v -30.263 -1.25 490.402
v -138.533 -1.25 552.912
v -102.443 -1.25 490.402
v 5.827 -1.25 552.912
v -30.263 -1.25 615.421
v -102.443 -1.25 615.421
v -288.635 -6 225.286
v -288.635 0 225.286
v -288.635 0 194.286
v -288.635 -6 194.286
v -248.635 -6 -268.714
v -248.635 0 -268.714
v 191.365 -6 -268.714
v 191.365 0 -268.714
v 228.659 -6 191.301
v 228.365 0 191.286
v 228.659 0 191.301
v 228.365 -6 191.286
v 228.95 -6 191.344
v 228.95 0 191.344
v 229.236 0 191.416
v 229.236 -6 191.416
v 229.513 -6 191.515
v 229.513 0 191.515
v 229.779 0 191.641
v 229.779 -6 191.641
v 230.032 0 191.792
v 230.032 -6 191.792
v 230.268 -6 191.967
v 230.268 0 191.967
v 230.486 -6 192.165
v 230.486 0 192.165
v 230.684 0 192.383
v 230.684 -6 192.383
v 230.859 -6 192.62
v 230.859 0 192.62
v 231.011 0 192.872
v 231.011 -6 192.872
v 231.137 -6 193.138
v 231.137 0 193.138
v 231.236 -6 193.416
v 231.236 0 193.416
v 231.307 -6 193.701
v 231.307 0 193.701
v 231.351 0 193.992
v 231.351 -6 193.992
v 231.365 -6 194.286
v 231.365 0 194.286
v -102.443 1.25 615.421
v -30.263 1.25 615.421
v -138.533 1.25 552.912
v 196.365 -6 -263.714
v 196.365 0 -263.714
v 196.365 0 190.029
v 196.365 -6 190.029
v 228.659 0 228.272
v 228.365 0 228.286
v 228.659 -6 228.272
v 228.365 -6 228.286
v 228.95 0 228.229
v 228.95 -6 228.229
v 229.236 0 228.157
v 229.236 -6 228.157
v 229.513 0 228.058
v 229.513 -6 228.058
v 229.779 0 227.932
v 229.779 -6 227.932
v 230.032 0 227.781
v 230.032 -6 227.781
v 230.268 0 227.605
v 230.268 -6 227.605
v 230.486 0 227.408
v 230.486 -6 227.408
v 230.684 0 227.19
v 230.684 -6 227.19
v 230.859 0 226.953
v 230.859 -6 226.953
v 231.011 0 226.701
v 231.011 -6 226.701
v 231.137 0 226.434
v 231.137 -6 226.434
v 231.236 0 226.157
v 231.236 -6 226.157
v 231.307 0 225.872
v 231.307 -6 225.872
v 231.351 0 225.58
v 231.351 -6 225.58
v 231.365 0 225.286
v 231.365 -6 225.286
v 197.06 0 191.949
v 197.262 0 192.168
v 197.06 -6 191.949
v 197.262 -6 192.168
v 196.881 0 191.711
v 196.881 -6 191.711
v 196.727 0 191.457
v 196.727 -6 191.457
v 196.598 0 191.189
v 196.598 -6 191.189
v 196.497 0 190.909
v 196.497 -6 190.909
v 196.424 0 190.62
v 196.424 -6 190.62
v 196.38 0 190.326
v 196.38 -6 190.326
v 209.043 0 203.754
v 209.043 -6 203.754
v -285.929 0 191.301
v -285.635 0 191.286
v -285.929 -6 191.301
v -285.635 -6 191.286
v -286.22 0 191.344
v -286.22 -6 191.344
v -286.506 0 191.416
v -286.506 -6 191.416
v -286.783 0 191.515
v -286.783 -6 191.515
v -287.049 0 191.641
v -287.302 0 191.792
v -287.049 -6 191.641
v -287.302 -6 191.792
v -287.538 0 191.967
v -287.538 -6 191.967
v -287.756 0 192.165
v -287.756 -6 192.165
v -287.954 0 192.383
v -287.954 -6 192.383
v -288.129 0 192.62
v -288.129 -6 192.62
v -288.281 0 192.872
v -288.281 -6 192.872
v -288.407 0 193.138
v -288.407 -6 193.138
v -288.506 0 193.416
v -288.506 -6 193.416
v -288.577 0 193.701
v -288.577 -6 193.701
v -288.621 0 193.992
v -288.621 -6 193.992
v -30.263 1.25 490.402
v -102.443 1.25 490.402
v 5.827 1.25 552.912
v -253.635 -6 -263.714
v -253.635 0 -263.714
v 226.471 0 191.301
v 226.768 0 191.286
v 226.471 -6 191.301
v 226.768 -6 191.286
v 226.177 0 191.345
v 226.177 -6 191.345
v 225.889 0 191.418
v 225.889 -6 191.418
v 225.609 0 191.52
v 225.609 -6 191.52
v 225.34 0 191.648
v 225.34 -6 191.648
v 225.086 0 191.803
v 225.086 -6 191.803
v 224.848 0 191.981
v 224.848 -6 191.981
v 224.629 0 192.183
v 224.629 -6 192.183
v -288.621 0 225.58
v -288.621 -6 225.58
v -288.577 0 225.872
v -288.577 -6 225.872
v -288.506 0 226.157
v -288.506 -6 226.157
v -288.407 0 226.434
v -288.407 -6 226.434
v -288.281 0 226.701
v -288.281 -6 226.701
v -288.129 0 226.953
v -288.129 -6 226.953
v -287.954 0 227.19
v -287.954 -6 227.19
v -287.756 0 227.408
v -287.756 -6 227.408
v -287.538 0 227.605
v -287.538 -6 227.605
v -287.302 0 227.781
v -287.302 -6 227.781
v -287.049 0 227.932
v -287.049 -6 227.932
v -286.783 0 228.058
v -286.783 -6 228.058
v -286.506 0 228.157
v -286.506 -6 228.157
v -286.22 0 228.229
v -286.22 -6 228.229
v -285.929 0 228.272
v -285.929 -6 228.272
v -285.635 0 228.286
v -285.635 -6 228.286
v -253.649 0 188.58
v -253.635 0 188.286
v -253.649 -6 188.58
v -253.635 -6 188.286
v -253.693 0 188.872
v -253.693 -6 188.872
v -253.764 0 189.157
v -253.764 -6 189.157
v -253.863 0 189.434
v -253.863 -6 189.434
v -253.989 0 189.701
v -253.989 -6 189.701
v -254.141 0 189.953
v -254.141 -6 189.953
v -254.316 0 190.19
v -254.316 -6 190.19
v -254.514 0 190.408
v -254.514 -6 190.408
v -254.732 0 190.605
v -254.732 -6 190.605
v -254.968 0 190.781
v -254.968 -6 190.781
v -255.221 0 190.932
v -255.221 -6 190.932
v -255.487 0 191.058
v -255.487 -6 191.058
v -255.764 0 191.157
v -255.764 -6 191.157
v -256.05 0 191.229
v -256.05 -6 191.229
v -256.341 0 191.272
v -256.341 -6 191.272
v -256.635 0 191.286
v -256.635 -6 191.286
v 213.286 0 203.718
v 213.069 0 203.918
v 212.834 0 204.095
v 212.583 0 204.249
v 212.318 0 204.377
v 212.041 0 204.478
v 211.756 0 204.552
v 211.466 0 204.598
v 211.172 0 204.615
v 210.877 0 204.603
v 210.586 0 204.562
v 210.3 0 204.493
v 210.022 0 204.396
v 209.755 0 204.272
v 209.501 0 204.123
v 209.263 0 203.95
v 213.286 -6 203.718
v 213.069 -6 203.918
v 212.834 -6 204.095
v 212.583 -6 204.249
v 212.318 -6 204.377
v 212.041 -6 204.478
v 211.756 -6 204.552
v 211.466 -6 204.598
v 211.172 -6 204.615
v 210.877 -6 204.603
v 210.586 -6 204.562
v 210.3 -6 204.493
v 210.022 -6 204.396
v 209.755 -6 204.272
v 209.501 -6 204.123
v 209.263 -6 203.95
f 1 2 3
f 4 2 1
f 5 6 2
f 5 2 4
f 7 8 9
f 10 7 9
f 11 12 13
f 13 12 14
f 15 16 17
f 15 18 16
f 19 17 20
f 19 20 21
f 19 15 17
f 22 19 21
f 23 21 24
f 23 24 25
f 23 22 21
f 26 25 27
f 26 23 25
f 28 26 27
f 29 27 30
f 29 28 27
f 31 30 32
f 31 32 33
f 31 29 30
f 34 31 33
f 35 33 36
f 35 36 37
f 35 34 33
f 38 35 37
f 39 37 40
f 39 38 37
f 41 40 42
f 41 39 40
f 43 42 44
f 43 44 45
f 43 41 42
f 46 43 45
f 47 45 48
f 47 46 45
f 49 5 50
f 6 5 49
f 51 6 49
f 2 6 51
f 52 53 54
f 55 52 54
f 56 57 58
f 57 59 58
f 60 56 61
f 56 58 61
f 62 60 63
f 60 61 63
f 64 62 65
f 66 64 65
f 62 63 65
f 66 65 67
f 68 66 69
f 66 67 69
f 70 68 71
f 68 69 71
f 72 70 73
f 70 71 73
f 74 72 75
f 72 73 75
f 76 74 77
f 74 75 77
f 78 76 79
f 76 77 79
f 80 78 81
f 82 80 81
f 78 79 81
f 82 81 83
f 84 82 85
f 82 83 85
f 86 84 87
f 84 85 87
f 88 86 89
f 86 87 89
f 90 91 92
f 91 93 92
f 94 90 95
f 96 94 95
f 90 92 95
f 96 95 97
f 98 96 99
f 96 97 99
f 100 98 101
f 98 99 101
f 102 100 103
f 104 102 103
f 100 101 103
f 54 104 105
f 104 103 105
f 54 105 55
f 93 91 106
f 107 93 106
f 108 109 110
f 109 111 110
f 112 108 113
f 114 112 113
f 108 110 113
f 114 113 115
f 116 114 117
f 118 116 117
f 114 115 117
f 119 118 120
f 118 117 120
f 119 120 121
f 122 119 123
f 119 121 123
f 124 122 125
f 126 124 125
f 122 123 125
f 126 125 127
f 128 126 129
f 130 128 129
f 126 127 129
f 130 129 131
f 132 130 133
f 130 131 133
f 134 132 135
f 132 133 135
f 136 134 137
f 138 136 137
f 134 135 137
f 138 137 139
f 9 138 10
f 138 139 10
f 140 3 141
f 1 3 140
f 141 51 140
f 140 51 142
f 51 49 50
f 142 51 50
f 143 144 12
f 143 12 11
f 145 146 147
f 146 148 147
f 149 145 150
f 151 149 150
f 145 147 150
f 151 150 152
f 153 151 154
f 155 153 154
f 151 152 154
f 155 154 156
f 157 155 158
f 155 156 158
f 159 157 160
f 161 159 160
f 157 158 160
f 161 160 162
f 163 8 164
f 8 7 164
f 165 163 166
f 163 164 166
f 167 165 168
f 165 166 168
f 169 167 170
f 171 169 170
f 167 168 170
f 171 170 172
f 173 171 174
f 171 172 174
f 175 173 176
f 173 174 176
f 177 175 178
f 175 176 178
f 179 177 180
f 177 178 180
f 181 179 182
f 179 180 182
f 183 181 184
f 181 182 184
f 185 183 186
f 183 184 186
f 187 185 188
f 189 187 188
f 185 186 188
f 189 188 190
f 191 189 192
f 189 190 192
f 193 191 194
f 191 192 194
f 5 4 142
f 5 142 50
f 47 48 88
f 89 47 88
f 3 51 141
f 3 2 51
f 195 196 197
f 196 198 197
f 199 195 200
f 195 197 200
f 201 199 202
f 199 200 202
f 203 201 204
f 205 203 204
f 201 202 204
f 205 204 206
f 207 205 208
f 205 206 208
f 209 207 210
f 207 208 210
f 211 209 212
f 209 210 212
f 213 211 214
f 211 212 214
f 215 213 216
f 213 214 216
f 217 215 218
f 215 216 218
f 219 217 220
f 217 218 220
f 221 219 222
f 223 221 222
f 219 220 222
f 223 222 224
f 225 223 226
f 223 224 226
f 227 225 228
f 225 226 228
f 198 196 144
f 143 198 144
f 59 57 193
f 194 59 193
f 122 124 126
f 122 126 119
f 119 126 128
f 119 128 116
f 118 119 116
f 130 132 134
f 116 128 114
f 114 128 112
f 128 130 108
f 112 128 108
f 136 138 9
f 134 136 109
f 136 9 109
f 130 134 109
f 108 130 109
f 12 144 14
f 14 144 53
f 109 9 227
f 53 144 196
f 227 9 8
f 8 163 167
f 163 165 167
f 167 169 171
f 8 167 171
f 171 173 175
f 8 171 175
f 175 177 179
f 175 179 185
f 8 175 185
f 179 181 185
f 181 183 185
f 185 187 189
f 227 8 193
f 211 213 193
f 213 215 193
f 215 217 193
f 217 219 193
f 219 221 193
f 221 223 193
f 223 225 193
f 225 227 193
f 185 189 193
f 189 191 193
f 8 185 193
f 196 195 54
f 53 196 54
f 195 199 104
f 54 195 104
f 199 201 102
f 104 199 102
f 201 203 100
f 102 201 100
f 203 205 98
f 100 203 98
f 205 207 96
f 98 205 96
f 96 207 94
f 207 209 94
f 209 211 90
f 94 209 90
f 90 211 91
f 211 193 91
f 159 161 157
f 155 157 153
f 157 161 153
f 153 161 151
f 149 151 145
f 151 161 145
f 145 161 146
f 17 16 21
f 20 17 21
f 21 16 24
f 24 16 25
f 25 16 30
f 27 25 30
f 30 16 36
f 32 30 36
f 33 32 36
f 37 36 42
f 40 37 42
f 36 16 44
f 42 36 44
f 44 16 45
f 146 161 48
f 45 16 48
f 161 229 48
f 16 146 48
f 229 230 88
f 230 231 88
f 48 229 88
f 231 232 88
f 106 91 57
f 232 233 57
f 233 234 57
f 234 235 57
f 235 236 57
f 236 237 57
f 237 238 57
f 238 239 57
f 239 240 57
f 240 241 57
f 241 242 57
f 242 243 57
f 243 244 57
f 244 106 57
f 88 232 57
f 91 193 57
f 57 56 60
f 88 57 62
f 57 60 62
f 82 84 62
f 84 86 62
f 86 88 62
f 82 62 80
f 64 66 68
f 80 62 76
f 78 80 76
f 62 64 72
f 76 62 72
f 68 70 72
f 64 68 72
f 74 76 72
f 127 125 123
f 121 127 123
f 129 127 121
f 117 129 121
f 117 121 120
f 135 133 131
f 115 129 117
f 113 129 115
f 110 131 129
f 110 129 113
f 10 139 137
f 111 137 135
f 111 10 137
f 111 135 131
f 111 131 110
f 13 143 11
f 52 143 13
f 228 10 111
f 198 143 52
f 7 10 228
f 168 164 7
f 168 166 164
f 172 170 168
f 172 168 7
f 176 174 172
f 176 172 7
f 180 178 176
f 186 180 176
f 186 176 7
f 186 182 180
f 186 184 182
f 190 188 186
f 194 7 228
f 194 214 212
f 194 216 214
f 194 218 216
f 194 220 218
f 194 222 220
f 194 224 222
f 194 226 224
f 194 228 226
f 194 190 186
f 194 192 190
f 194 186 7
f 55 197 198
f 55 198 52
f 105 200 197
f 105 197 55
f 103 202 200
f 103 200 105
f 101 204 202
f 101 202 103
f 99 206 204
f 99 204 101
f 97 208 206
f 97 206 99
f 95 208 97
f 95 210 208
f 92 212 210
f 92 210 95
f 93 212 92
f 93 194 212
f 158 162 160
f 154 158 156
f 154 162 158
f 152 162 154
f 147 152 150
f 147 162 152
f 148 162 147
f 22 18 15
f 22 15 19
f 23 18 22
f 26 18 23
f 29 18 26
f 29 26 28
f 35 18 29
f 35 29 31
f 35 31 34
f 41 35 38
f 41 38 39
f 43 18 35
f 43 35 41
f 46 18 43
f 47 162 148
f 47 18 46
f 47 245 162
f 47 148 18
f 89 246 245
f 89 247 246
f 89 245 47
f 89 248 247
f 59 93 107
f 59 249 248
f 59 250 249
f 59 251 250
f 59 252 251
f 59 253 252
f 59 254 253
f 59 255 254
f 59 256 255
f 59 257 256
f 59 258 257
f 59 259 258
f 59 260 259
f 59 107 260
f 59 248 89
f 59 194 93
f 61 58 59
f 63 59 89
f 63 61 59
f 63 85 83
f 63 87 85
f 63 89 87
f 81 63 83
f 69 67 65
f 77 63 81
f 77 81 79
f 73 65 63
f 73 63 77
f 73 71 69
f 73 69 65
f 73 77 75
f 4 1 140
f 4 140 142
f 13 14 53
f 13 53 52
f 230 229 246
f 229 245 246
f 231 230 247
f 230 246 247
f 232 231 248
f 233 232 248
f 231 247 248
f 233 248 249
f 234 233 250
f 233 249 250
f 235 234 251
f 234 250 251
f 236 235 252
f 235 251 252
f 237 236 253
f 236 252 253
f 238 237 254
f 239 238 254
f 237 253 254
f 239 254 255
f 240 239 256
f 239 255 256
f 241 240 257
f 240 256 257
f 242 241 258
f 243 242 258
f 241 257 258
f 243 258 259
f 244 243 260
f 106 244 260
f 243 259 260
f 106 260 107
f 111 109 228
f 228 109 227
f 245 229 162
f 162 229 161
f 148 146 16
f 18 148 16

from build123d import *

# Parameters (mm, degrees)
F1_DEPTH = 6
F3_DEPTH = 1.25
F4_SIZE  = 5
F5_R     = 3
F6_R     = 3
F7_R     = 3
F8_R     = 3
F9_R     = 3
F10_R    = 3
F11_R    = 3
F12_R    = 3


with BuildPart() as f1:
    # F0 (on Front) → F1 (new body)
    with BuildSketch(Plane.XZ):
        Polygon((231.364989, 228.2864), (-288.635011, 228.2864), (-288.635011, 191.2864), (-253.635011, 191.2864), (-253.635011, -268.7136), (196.364989, -268.7136), (196.364989, 191.2864), (211.182013, 205.857411), (225.511095, 191.2864), (231.364989, 191.2864), align=None)
    extrude(amount=F1_DEPTH)

    # F4
    f4_edges = [f1.edges().sort_by_distance(p)[0] for p in [
        (196.364989, -3, -268.7136),
        (-253.635011, -3, -268.7136),
    ]]
    chamfer(f4_edges, length=F4_SIZE)

    # F5
    f5_edges = [f1.edges().sort_by_distance(p)[0] for p in [
        (-288.635011, -3, 191.2864),
    ]]
    fillet(f5_edges, radius=F5_R)

    # F6
    f6_edges = [f1.edges().sort_by_distance(p)[0] for p in [
        (-288.635011, -3, 228.2864),
    ]]
    fillet(f6_edges, radius=F6_R)

    # F7
    f7_edges = [f1.edges().sort_by_distance(p)[0] for p in [
        (231.364989, -3, 228.2864),
    ]]
    fillet(f7_edges, radius=F7_R)

    # F8
    f8_edges = [f1.edges().sort_by_distance(p)[0] for p in [
        (196.364989, -3, 191.2864),
    ]]
    fillet(f8_edges, radius=F8_R)

    # F9
    f9_edges = [f1.edges().sort_by_distance(p)[0] for p in [
        (231.364989, -3, 191.2864),
    ]]
    fillet(f9_edges, radius=F9_R)

    # F10
    f10_edges = [f1.edges().sort_by_distance(p)[0] for p in [
        (225.511095, -3, 191.2864),
    ]]
    fillet(f10_edges, radius=F10_R)

    # F11
    f11_edges = [f1.edges().sort_by_distance(p)[0] for p in [
        (211.182013, -3, 205.857411),
    ]]
    fillet(f11_edges, radius=F11_R)

    # F12
    f12_edges = [f1.edges().sort_by_distance(p)[0] for p in [
        (-253.635011, -3, 191.2864),
    ]]
    fillet(f12_edges, radius=F12_R)


with BuildPart() as f3:
    # F2 (on Front) → F3 (new body, symmetric)
    with BuildSketch(Plane.XZ):
        Polygon((-102.443321, 490.401806), (-30.263321, 490.401806), (5.826679, 552.91152), (-30.263321, 615.421234), (-102.443321, 615.421234), (-138.533321, 552.91152), align=None)
    extrude(amount=F3_DEPTH, both=True)


solid = Compound([f1.part, f3.part])
